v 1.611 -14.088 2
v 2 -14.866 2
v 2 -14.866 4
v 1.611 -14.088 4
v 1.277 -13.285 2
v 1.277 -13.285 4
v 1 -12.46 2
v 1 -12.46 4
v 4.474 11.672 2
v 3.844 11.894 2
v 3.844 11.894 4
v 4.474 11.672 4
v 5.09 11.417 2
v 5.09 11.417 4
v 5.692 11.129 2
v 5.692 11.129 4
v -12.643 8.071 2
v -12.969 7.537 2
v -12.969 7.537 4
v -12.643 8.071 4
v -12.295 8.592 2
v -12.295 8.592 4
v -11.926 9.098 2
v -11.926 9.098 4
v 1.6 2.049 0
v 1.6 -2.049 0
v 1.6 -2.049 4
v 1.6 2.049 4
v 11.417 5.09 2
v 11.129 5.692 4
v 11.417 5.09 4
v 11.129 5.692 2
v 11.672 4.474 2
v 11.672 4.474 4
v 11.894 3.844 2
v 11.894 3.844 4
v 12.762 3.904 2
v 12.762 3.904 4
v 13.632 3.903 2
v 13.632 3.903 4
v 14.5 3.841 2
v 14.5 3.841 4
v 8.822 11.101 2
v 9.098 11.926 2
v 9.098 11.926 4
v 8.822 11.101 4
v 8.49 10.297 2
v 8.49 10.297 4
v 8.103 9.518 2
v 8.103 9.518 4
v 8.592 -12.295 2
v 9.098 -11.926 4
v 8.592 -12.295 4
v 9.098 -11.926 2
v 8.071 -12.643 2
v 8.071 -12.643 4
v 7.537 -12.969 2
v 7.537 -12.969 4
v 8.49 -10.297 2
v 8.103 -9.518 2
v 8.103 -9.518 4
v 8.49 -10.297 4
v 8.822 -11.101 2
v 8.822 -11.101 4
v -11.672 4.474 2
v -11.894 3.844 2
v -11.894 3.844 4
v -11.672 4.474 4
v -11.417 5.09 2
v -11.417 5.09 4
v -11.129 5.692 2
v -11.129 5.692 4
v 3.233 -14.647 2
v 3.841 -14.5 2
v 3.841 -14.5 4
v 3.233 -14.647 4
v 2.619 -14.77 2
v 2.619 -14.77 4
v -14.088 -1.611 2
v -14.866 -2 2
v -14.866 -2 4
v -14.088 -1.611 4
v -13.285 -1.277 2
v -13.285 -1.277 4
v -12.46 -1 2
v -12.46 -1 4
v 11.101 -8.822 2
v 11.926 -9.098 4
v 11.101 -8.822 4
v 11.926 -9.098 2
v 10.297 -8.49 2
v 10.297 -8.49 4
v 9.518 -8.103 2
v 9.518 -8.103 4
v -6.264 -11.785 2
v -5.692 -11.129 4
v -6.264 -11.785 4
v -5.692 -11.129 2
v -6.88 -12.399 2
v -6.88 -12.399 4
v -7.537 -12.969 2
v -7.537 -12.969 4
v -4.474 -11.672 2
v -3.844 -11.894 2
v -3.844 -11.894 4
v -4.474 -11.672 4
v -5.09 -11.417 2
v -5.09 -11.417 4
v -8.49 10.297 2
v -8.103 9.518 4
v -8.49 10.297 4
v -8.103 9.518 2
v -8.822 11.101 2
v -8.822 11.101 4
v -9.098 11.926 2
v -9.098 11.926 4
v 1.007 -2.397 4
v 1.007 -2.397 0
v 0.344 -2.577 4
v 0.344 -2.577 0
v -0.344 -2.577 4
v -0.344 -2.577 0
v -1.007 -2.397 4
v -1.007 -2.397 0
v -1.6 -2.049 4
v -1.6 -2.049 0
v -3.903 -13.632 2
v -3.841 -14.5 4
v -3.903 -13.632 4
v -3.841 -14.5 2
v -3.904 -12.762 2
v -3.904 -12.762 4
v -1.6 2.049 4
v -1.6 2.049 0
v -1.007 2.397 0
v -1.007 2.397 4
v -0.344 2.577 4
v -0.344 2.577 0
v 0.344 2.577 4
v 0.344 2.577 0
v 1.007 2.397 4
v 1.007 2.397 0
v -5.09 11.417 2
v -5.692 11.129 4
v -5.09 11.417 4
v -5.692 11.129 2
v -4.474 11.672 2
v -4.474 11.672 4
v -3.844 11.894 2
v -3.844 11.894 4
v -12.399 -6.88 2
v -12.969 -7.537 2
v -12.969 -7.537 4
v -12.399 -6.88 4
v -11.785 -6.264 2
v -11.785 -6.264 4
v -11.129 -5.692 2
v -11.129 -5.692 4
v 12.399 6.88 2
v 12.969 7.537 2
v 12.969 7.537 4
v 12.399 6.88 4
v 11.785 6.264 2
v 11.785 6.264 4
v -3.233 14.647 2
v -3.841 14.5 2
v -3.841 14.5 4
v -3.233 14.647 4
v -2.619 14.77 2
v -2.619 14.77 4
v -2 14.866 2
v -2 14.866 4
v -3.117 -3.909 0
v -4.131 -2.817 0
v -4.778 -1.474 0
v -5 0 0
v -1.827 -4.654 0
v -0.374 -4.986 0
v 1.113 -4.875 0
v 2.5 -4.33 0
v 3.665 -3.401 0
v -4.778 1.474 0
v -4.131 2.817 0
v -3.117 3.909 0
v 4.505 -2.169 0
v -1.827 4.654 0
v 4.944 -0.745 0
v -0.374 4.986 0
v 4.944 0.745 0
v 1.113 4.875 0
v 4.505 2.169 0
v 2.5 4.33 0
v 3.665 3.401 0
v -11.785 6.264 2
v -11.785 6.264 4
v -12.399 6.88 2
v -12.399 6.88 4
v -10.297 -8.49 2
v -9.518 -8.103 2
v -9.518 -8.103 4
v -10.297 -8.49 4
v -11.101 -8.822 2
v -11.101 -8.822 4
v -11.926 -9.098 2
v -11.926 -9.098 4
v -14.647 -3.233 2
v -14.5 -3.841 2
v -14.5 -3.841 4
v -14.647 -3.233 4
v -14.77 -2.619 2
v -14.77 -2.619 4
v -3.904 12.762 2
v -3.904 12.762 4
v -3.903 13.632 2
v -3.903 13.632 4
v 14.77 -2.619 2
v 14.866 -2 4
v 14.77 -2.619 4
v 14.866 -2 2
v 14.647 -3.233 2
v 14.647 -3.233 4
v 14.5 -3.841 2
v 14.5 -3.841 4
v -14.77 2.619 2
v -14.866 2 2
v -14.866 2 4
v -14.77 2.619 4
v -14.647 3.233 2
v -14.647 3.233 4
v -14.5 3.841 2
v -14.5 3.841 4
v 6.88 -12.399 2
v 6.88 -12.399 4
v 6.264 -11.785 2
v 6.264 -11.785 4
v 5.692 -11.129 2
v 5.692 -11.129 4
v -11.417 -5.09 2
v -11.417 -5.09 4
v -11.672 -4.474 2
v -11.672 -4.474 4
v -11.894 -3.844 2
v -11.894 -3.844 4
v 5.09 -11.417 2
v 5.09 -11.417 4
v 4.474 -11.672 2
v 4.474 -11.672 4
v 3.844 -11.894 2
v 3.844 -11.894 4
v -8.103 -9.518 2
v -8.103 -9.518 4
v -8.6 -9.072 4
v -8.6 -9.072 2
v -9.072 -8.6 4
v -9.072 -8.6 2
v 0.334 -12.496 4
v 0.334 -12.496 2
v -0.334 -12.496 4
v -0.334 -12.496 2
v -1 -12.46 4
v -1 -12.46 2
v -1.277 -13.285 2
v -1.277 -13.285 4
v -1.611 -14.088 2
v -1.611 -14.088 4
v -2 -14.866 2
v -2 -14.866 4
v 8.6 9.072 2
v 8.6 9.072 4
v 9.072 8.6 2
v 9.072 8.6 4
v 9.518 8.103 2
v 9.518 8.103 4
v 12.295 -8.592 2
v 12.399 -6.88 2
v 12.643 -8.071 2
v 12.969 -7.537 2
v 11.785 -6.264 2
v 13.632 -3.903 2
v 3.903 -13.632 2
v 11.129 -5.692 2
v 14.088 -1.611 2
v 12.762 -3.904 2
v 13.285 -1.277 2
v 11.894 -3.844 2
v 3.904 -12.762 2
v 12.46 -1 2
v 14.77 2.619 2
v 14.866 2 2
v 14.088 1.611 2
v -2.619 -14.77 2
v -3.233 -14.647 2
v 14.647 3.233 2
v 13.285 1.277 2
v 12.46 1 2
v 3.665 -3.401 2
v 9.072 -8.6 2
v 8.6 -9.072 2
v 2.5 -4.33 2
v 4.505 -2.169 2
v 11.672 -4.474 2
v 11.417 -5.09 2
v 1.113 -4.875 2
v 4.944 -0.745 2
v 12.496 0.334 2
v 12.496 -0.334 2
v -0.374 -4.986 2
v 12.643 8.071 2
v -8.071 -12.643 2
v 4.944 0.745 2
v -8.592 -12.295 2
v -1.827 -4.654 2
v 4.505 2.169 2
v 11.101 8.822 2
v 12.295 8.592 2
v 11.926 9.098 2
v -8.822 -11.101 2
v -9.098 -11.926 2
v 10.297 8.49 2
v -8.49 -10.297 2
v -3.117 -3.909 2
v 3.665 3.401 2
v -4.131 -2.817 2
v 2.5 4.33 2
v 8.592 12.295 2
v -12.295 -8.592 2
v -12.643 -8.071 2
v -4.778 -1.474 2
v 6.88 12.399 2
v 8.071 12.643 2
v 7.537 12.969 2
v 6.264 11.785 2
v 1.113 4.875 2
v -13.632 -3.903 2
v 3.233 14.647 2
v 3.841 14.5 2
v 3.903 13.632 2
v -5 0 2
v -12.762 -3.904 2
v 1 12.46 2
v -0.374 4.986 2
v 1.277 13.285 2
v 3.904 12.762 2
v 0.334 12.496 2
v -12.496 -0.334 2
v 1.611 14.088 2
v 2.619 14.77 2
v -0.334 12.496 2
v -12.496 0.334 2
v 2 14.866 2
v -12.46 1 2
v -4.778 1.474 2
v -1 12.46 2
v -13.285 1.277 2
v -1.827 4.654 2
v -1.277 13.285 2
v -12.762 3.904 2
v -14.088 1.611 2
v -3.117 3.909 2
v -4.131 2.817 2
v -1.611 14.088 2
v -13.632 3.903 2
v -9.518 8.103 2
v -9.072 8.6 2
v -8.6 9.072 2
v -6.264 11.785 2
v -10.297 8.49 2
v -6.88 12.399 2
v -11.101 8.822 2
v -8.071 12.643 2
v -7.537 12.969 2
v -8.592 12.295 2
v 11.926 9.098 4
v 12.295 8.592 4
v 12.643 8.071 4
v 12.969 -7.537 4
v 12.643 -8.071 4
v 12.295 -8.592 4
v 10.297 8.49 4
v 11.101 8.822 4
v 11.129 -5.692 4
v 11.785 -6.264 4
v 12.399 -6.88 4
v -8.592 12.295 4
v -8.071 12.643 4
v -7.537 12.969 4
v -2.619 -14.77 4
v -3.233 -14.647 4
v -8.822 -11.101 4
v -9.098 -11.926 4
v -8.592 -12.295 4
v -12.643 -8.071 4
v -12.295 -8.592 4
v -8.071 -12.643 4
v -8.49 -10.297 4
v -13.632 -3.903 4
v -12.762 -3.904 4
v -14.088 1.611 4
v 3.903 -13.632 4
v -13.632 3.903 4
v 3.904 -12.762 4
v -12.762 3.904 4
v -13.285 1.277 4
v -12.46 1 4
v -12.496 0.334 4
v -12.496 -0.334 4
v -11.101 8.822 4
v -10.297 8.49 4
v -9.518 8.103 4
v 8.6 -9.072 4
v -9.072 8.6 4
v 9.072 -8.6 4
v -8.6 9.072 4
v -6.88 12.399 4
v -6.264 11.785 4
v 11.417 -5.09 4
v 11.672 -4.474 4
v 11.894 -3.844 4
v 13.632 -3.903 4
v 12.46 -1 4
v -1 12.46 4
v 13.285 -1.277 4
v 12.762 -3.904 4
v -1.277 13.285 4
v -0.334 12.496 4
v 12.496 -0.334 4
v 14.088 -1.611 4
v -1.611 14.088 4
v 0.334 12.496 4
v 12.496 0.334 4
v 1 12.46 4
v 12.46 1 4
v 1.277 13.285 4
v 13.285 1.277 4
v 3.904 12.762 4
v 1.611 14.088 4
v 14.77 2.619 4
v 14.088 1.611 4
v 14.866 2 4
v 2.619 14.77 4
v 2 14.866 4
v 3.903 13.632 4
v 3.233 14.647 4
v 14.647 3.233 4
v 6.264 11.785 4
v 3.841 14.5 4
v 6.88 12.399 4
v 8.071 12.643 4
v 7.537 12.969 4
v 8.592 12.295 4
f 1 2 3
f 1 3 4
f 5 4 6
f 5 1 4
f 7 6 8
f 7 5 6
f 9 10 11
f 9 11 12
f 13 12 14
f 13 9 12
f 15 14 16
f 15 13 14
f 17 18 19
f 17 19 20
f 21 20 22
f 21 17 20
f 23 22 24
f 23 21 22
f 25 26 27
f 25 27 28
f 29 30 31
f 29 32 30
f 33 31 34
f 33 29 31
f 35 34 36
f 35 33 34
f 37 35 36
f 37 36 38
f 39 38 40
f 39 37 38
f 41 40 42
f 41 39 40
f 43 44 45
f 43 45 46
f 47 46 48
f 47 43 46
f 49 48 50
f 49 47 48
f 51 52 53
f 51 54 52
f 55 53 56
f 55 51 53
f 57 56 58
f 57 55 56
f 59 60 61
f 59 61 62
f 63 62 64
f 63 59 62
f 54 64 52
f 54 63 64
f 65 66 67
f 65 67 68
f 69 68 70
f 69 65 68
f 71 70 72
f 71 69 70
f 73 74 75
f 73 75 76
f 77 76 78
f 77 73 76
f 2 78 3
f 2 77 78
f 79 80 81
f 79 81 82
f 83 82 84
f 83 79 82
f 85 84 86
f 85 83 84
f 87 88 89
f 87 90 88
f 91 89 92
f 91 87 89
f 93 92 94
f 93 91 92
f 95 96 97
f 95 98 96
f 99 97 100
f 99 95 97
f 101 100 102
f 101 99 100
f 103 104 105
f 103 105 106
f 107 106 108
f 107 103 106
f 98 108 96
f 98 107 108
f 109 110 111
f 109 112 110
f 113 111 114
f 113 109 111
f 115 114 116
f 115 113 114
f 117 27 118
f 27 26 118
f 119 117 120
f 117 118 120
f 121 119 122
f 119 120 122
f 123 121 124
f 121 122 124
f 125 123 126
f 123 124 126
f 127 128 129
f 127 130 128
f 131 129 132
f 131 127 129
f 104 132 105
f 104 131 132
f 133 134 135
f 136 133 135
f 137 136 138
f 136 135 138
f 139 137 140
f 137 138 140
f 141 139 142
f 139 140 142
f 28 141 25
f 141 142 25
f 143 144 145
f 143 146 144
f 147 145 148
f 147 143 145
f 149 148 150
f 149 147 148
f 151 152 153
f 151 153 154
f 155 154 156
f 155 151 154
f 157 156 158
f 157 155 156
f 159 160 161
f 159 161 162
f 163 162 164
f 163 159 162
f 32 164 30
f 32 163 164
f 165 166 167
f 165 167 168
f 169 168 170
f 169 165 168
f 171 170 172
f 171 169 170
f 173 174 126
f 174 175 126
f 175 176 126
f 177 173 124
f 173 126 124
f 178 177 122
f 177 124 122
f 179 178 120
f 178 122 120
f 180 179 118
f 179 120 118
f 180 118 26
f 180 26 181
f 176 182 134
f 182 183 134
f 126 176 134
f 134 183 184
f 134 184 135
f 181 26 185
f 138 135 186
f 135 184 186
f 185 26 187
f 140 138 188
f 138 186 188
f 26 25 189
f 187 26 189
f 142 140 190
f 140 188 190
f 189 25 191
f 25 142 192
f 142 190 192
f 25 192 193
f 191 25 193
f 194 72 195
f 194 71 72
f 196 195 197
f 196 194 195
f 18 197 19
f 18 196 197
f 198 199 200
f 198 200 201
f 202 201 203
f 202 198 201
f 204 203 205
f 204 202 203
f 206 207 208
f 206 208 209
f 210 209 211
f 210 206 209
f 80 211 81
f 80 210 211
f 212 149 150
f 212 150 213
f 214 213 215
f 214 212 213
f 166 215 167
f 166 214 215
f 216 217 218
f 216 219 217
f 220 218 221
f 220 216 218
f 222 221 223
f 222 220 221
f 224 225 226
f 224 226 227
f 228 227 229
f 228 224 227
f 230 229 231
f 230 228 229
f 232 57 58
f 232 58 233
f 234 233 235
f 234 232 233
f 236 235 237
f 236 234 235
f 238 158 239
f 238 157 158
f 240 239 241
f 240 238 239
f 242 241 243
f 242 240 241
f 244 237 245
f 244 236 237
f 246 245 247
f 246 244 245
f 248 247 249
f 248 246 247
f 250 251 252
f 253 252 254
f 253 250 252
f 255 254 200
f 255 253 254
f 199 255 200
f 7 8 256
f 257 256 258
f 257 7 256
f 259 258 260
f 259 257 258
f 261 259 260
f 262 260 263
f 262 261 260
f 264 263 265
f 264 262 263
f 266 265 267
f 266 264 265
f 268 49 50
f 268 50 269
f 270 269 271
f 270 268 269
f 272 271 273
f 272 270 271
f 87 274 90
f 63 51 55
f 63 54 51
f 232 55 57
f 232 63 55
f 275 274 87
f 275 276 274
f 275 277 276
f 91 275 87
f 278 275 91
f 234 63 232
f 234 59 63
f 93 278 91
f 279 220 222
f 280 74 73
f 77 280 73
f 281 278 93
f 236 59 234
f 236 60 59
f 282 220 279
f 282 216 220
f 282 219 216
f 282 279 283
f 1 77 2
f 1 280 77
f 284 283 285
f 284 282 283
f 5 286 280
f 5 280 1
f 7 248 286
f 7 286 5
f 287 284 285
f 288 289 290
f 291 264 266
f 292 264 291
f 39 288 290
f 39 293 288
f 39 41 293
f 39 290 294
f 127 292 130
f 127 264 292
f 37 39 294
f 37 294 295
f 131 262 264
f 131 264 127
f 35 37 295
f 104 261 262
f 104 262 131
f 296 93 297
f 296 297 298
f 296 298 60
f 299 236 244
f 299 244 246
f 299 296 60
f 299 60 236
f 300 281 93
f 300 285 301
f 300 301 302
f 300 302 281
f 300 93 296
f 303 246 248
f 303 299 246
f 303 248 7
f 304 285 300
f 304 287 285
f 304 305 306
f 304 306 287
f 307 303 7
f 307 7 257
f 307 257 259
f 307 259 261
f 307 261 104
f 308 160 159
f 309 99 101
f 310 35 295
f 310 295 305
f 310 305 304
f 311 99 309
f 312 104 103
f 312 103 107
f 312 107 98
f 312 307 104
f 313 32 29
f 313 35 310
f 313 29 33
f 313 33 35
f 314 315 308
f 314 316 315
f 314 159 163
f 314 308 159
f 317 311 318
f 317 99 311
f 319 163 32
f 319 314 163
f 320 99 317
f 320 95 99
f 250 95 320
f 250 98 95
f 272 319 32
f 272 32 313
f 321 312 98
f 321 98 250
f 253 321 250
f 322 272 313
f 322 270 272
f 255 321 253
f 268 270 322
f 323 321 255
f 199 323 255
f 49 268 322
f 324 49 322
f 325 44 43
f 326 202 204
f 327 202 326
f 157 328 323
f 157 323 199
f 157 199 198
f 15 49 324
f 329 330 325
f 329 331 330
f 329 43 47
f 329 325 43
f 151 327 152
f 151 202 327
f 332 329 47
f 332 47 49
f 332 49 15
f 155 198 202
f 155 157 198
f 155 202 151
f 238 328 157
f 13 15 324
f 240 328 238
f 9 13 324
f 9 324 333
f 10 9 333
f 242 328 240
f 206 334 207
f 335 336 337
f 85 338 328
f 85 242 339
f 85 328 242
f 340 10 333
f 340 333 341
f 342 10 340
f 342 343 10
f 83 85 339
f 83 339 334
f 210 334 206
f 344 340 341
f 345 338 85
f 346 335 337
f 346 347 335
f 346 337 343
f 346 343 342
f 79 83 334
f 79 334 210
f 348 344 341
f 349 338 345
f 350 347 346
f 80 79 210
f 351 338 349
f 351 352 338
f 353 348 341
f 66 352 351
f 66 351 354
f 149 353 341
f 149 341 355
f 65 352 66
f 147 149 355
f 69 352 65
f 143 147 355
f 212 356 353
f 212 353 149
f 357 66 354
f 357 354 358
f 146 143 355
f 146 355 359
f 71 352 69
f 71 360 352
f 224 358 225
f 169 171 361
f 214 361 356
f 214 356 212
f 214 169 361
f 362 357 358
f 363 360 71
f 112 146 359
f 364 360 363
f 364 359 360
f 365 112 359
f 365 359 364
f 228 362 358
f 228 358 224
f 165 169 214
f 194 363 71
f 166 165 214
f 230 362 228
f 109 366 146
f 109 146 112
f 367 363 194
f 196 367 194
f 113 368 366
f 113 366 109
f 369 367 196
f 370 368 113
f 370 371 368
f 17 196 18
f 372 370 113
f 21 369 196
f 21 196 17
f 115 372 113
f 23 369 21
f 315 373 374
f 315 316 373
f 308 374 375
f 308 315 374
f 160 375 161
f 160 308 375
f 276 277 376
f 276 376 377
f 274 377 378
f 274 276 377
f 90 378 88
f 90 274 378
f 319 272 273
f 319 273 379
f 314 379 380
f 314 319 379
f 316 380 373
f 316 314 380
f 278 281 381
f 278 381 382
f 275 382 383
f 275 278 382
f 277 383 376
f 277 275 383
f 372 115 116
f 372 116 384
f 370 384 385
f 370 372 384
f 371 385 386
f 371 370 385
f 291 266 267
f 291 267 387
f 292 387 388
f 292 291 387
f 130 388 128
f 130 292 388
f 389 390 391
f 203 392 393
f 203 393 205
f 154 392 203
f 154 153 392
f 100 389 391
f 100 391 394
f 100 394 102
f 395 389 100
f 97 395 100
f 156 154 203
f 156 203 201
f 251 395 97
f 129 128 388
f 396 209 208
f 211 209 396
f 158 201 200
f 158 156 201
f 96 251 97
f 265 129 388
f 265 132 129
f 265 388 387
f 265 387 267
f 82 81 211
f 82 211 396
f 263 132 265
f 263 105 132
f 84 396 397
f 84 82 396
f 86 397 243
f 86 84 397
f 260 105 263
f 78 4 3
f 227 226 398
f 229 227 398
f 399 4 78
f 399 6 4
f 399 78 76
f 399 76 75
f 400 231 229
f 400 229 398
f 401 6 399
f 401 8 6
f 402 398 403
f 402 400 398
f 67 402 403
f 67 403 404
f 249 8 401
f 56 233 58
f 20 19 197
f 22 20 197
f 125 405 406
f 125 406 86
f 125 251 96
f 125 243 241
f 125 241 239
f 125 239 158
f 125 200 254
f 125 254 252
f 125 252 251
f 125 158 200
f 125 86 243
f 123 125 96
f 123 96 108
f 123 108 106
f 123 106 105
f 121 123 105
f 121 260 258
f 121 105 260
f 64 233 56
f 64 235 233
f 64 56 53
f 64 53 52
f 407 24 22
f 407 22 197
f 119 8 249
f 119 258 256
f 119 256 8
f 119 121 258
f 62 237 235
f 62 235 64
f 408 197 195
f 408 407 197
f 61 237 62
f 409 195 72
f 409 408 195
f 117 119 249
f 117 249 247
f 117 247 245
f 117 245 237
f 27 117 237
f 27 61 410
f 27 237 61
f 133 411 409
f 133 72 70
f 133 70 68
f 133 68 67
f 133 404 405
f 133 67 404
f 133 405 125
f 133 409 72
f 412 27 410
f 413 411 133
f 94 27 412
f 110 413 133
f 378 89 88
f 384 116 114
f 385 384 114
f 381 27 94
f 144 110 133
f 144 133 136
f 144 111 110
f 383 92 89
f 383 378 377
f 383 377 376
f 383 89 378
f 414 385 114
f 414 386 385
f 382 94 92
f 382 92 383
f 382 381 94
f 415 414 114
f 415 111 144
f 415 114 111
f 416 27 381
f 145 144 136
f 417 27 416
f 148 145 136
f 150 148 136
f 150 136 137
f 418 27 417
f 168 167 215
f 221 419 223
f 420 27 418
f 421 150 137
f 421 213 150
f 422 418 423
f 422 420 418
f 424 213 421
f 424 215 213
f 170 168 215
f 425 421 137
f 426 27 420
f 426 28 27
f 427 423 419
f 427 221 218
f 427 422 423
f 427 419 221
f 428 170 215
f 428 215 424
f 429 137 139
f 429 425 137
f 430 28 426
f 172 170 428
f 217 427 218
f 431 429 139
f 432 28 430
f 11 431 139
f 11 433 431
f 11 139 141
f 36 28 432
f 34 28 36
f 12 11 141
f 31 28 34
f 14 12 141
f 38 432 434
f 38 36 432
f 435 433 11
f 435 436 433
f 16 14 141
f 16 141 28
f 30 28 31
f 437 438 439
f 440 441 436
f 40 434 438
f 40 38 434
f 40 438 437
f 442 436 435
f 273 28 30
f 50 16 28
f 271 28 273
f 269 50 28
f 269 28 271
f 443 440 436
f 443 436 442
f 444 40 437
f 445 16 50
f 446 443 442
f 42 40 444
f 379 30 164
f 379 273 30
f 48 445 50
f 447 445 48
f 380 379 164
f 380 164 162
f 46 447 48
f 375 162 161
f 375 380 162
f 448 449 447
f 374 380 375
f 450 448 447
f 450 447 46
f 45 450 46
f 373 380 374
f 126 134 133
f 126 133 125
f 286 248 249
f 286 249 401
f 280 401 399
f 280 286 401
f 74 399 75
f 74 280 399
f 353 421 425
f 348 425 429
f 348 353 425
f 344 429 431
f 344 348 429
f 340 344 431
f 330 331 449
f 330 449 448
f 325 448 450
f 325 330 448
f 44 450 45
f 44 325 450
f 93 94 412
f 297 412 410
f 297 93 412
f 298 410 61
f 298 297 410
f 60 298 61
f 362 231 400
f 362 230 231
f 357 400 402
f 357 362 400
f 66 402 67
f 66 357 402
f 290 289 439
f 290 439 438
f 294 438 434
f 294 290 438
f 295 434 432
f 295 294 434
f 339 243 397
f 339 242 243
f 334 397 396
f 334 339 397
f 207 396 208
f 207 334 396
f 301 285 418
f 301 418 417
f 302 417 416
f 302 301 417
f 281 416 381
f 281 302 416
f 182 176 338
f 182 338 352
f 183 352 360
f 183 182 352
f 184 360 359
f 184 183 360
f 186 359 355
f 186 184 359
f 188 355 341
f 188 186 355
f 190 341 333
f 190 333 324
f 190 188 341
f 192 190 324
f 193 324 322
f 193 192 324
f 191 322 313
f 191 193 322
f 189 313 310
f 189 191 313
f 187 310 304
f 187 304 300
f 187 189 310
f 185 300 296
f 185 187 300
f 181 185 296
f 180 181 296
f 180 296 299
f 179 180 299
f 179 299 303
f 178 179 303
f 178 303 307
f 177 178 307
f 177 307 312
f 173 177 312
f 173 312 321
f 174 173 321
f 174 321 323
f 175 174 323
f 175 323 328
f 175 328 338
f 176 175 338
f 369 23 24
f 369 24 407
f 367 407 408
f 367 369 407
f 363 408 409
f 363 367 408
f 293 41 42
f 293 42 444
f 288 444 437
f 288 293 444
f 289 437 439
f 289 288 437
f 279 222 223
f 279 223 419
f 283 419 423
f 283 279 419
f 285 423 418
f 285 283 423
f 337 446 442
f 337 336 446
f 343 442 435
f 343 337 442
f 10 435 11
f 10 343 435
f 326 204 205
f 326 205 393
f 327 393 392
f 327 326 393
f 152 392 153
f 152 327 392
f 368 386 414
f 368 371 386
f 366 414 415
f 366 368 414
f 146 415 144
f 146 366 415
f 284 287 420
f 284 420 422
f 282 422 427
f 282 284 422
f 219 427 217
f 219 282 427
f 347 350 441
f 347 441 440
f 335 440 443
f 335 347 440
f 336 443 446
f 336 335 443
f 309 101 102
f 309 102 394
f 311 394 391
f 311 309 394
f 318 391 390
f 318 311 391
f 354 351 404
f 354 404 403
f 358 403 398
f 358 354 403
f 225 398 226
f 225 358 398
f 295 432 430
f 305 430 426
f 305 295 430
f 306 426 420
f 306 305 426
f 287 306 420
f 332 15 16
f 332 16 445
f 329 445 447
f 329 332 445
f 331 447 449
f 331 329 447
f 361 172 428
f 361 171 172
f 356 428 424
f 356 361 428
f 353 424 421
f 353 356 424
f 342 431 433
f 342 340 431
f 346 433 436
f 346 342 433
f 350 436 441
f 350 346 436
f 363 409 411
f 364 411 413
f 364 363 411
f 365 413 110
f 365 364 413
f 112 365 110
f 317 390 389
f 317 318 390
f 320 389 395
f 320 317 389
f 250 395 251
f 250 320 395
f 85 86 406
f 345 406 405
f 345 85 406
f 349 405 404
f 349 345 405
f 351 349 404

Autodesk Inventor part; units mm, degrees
ref_plane "YZ Plane" through (0, 0, 0) normal (1, 0, 0) x (0, 1, 0)
ref_plane "XY Plane" through (0, 0, 0) normal (0, 0, 1) x (1, 0, 0)
sketch "Skizze1" plane through (0, 0, 0) normal (0, 0, 1) x (1, 0, 0)
  circle A0 centre (0, 0) radius 2.6
  circle A1 centre (0, 0) radius 15
  line L0 (-1.6, 2.0494) -> (-1.6, -2.0494)
  line L1 (1.6, -2.0494) -> (1.6, 2.0494)
  dimension "d0" = 5.2
  dimension "d1" = 30
  dimension "d2" = 3.2
extrude "Extrusion1" add sketch "Skizze1" along normal blind 4 contours A0 L1 | L0 A0 | A1
sketch "Skizze3" plane through (0, 0, 0) normal (0, 0, -1) x (-1, 0, 0)
  circle A0 centre (0, 0) radius 5
  circle A1 centre (0, 0) radius 15
  dimension "d8" = 10
  dimension "d9" = 30
extrude "Extrusion3" cut sketch "Skizze3" against normal blind 2
sketch "Skizze4" plane through (0, 0, 2) normal (0, 0, -1) x (-1, 0, 0)
  circle A0 centre (0, 0) radius 12.5 construction
  circle A1 centre (0, 0) radius 15 projected
  line L0 (-15, 0) -> (-12.5, 0)
  arc A2 (-12.4599, -1) -> (-14.8661, -2) centre (-8.8919, -12.9799) ccw
  arc A3 (-14.8661, 2) -> (-12.4599, 1) centre (-8.8919, 12.9799) ccw
  arc A4 (-14.8661, 2) -> (-14.8661, -2) centre (0, 0) ccw
  arc A5 (-12.4599, 1) -> (-12.4599, -1) centre (0, 0) ccw
  circle A6 centre (0, 0) radius 15 projected
  point P0 (-13.75, 0)
  dimension "d12" = 25
  dimension "d13" = 12.5
  dimension "d14" = 4
  dimension "d15" = 2
extrude "Extrusion4" cut sketch "Skizze4" against normal blind 2 contours A3 A5 L0 A1 | A1 L0 A5 A2
pattern_circular "Runde Anordnung1" count 16 over 360 about axis through (0, 0, 0) along (0, 0, 1) of "Extrusion4"
ref_plane "Arbeitsebene1" through (0, 16.5, 0) normal (0, 1, 0) x (-1, 0, 0)
properties part number "Adapter Stepper"
